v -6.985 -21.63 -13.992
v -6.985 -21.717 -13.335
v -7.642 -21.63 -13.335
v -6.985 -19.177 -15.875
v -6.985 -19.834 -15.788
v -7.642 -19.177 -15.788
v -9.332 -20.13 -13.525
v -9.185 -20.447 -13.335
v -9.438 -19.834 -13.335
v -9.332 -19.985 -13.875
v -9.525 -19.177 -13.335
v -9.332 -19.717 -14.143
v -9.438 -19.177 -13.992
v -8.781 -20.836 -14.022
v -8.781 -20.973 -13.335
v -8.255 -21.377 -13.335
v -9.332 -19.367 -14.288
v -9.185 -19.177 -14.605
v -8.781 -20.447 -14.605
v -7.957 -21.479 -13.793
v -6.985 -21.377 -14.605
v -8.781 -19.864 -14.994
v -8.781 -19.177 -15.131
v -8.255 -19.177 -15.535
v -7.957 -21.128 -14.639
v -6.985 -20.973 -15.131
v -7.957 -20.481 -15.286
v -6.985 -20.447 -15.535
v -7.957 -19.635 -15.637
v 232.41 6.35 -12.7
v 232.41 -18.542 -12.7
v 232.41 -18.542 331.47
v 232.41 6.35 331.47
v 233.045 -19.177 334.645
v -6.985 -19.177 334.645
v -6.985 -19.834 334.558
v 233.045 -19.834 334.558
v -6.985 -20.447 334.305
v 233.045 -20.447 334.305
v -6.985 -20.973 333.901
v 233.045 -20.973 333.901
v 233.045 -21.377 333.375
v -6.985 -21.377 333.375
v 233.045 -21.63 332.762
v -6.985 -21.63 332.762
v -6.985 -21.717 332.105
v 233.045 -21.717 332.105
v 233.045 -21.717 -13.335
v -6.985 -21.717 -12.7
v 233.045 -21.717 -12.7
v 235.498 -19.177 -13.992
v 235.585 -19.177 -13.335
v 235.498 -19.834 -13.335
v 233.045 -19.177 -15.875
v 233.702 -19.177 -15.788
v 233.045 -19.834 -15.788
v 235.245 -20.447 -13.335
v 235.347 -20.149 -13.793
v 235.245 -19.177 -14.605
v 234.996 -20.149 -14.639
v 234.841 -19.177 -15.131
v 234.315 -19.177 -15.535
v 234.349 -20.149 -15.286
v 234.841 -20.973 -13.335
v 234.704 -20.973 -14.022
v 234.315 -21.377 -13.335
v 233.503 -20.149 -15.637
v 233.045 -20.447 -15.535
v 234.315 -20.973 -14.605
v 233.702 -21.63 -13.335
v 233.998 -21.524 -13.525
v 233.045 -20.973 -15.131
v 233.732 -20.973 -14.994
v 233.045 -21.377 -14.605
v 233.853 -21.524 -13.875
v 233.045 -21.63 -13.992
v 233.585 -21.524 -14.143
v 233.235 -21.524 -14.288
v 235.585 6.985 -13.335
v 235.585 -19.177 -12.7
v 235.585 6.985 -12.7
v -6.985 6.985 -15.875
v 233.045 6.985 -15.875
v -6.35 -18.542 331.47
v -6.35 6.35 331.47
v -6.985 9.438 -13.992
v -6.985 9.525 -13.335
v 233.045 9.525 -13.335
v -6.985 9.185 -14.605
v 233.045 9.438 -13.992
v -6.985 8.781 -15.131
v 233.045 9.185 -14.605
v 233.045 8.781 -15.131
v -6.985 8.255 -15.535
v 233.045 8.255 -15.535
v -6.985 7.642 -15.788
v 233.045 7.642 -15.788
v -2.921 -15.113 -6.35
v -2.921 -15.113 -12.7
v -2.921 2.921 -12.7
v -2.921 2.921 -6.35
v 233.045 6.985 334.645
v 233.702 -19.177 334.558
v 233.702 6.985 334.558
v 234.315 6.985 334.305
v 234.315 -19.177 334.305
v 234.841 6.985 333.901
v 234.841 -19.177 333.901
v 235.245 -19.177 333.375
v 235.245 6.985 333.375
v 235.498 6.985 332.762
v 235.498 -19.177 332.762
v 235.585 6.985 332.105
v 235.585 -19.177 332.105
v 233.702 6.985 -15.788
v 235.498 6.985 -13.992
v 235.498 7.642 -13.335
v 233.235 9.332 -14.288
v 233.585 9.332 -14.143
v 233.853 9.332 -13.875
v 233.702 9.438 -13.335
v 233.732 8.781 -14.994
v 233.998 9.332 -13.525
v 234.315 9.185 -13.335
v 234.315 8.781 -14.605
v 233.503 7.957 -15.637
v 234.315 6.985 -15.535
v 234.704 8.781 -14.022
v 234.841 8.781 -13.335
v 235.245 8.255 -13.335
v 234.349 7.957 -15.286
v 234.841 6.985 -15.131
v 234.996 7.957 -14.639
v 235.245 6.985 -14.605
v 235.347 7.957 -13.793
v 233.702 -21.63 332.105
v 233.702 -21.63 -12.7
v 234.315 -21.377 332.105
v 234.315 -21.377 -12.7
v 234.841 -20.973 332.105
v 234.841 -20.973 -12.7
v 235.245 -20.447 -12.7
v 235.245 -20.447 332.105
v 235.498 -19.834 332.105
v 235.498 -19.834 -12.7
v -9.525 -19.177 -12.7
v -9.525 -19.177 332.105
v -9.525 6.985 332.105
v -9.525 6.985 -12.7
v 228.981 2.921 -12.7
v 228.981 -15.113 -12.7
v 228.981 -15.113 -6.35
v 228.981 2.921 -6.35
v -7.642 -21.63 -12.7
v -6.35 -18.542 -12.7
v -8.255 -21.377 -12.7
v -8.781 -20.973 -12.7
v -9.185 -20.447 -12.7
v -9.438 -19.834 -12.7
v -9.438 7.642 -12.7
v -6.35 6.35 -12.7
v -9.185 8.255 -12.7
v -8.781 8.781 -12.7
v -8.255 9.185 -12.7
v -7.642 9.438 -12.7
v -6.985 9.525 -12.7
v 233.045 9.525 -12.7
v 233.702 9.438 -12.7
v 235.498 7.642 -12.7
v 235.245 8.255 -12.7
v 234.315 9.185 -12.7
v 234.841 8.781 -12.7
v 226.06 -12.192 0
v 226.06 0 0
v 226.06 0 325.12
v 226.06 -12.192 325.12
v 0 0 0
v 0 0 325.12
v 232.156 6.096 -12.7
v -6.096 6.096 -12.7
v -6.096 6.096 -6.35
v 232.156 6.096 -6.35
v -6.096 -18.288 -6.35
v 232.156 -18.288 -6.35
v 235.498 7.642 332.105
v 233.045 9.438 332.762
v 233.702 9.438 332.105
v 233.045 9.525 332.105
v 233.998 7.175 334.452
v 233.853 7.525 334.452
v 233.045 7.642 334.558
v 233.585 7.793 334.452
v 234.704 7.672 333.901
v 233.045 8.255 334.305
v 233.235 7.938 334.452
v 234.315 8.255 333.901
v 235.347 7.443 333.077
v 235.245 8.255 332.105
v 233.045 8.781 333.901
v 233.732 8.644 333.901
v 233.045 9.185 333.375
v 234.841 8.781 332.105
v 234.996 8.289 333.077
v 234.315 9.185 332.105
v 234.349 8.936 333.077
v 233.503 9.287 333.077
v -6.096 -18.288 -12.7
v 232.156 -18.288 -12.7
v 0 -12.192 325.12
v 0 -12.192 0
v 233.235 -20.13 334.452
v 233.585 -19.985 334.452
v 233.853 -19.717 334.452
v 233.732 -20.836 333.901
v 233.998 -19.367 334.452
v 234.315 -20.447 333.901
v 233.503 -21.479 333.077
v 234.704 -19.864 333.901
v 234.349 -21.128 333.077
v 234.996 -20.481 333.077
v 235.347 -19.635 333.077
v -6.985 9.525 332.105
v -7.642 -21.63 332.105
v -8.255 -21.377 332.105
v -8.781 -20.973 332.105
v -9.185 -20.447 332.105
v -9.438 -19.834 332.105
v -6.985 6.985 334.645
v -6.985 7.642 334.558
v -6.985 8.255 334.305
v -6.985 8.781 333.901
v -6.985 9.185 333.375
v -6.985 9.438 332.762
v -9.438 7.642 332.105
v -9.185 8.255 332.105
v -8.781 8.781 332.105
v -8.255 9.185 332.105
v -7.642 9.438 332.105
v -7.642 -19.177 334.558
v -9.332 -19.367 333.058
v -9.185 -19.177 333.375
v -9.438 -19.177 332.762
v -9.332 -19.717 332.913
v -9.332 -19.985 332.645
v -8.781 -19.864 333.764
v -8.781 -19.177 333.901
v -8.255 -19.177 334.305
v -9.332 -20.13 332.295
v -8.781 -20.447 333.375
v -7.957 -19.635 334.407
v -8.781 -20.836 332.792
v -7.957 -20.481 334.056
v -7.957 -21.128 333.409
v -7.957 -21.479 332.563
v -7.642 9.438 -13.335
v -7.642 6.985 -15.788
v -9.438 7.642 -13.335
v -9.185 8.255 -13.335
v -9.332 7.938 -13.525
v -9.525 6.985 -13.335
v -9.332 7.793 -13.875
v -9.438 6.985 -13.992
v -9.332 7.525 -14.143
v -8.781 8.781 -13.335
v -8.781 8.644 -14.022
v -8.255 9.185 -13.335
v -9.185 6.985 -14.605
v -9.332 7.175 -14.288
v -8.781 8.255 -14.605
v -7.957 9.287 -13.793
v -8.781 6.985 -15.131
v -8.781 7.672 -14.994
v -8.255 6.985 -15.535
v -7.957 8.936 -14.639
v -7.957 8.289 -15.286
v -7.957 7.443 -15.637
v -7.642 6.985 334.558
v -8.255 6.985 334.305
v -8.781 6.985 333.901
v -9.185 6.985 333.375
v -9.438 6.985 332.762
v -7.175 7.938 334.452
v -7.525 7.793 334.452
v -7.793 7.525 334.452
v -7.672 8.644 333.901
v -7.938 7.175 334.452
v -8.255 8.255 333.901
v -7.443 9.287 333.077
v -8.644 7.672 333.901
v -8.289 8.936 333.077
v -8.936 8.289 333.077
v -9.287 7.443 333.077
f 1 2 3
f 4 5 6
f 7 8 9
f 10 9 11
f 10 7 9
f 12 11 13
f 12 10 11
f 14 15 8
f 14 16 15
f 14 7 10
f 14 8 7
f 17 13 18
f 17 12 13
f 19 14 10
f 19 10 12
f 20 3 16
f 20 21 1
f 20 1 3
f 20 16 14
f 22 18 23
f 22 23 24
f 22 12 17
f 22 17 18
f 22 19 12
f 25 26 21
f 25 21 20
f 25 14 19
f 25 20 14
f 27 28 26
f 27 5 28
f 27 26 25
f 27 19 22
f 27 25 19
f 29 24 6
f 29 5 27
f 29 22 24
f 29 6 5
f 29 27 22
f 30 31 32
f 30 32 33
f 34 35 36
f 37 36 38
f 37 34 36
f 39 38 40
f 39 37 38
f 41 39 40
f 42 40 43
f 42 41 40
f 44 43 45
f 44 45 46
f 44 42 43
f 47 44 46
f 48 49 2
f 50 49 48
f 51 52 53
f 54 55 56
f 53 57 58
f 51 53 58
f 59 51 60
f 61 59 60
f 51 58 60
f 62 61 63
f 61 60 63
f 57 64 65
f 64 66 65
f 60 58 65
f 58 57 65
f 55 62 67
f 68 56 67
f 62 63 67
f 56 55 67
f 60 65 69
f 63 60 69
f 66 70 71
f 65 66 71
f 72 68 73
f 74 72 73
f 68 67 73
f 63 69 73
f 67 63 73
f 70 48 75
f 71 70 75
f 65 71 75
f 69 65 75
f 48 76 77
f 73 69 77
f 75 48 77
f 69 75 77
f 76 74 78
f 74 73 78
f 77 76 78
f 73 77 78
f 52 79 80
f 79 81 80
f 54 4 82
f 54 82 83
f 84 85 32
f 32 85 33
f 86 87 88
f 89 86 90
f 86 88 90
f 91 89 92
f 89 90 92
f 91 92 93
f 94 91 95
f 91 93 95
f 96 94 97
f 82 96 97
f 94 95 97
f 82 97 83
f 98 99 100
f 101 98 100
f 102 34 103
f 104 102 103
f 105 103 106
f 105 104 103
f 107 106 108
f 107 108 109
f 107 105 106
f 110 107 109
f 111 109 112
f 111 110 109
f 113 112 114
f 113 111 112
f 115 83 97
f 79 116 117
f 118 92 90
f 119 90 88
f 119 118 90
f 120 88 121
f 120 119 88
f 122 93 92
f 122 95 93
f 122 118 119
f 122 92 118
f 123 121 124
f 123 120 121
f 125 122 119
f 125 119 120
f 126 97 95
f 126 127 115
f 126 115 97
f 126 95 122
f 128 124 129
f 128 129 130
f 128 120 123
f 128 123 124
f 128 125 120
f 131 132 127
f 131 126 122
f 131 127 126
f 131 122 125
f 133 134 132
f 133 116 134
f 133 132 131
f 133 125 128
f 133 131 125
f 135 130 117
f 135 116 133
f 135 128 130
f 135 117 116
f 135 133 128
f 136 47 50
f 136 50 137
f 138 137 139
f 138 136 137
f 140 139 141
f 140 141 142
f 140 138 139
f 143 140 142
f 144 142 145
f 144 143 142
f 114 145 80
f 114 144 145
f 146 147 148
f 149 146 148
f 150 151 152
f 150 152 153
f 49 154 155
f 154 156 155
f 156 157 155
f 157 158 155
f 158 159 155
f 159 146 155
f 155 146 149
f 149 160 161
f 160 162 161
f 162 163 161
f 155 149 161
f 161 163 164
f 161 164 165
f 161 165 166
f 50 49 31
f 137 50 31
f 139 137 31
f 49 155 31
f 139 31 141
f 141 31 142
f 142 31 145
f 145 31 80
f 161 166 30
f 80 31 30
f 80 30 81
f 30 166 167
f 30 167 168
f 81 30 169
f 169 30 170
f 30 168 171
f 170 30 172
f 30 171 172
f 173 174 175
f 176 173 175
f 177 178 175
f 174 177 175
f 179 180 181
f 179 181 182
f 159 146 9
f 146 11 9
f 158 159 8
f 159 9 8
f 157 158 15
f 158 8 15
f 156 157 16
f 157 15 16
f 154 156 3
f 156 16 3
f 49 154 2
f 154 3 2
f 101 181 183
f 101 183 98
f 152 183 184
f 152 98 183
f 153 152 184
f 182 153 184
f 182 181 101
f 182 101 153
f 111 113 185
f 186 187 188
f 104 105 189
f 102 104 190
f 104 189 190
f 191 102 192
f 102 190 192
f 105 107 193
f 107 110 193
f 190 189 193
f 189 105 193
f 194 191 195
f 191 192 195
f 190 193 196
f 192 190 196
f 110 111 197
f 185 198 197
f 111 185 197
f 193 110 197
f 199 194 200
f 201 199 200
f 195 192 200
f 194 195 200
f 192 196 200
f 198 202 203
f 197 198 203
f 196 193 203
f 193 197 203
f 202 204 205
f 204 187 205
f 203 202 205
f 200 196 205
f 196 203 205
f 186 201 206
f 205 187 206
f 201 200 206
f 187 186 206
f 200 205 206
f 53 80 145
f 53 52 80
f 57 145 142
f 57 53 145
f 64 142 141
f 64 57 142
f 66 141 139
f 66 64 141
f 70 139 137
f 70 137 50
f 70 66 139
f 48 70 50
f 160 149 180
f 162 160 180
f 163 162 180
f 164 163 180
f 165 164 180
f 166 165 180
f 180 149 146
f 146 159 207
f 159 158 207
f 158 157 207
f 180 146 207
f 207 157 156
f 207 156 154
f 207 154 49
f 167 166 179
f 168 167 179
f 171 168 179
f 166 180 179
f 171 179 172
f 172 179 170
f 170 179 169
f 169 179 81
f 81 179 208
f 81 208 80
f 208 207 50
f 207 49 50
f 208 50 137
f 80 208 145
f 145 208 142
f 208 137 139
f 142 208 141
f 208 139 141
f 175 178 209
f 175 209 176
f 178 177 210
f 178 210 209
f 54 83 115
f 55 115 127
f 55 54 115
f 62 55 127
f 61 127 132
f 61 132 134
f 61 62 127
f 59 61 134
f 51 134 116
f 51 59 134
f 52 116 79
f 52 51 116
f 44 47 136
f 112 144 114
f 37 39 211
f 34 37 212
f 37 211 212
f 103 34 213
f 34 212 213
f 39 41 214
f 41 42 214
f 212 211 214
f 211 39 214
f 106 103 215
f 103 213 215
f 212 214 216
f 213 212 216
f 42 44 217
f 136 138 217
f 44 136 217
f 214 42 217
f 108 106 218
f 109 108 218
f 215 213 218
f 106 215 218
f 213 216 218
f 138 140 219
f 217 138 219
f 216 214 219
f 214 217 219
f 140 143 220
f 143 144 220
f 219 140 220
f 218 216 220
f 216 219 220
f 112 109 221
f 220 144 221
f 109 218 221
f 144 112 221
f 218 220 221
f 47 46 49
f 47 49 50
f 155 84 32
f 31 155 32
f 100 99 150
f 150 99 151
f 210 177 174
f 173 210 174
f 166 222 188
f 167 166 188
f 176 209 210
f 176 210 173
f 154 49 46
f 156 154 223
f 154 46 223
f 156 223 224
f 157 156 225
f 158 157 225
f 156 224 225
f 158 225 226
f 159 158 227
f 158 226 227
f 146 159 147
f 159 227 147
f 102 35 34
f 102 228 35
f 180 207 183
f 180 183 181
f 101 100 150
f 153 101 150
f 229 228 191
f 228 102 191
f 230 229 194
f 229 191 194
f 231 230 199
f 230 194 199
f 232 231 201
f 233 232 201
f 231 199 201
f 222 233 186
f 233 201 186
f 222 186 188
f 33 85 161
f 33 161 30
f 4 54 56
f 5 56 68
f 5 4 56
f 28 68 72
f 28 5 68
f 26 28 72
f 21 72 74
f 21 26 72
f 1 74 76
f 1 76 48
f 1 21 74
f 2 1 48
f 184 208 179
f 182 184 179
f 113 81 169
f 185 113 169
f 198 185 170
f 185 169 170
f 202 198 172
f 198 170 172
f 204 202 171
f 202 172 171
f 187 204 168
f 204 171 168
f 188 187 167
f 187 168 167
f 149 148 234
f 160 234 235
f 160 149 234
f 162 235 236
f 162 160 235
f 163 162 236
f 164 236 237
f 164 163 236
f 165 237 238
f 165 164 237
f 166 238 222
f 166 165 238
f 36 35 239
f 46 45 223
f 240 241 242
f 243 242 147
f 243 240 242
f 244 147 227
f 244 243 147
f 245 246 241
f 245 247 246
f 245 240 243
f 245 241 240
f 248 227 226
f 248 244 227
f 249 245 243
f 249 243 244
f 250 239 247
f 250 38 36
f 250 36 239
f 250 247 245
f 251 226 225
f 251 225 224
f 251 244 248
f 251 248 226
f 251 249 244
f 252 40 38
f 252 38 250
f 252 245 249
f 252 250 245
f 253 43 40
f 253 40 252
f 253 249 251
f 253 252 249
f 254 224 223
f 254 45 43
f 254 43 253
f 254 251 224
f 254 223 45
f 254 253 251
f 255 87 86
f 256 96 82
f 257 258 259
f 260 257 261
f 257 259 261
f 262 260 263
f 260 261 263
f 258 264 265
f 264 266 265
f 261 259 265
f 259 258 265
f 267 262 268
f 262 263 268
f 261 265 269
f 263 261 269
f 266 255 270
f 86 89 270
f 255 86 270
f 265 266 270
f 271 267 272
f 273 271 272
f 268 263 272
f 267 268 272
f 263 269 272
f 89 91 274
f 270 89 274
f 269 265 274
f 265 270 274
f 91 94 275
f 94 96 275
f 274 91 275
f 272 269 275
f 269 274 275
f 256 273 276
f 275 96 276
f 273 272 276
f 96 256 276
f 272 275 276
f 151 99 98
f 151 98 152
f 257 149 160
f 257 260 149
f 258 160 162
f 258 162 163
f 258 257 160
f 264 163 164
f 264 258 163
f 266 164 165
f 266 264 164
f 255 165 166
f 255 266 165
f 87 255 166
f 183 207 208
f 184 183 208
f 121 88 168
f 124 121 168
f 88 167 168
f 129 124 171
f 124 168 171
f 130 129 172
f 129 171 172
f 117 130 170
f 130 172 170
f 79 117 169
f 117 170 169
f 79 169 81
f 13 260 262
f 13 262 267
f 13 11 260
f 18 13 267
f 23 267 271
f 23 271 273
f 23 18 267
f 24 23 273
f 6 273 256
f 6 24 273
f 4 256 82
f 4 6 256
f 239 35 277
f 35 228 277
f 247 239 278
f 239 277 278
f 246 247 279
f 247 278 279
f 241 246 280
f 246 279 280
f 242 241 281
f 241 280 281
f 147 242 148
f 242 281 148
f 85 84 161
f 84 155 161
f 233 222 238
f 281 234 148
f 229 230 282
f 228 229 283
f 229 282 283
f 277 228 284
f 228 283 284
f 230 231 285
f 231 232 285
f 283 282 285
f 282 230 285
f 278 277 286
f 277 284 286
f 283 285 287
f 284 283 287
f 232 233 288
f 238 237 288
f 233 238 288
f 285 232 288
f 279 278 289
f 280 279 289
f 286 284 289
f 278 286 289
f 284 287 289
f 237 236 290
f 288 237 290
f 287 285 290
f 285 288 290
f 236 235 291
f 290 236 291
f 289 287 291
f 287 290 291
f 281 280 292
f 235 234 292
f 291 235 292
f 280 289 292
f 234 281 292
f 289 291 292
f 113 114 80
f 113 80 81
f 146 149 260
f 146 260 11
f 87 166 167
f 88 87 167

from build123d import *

# Parameters (mm, degrees)
F0_W          = 226.06
F0_H          = 325.12
F1_DEPTH      = 12.192
F2_W          = 245.11
F2_H          = 31.242
F2_W_2        = 238.76
F2_H_2        = 24.892
F3_DEPTH      = 337.82
F3_DEPTH_BACK = 6.35
F4_W          = 245.11
F4_H          = 31.242
F5_DEPTH      = 3.175
F6_W          = 245.11
F6_H          = 31.242
F7_DEPTH      = 3.175
F8_W          = 238.252
F8_H          = 24.384
F8_W_2        = 231.902
F8_H_2        = 18.034
F9_DEPTH      = 6.35
F10_R         = 2.54
F11_R         = 2.54
F11_2_R       = 2.54
F12_R         = 2.54
F12_2_R       = 2.54


# Not quite as in the source:
# - two fillets or chamfers of one size are made in one step


with BuildPart() as f1:
    # F0 (on Front) → F1 (new body)
    with BuildSketch(Plane.XZ):
        with Locations((113.03, 162.56)):
            Rectangle(F0_W, F0_H)
    extrude(amount=F1_DEPTH)


with BuildPart() as f3:
    # F2 (on face) → F3 (new body, two sides)
    with BuildSketch(Plane.XY.offset(325.12)) as f3_sk:
        with Locations((113.03, -6.096)):
            Rectangle(F2_W, F2_H)
        with Locations((113.03, -6.096)):
            Rectangle(F2_W_2, F2_H_2, mode=Mode.SUBTRACT)
    extrude(amount=-F3_DEPTH)
    extrude(f3_sk.sketch, amount=F3_DEPTH_BACK)

    # F4 (on face) → F5 (join)
    with BuildSketch(Plane.XY.offset(331.47)):
        with Locations((113.03, -6.096)):
            Rectangle(F4_W, F4_H)
    extrude(amount=F5_DEPTH)

    # F11
    f11_edges = [f3.edges().sort_by_distance(p)[0] for p in [
        (235.585, -21.717, 160.9725),
    ]]
    fillet(f11_edges, radius=F11_R)

    # F12
    f12_edges = [f3.edges().sort_by_distance(p)[0] for p in [
        (235.585, 9.525, 160.9725),
        (235.585, -4.826, 334.645),
        (234.841051, -20.973051, 334.645),
        (-9.525, 9.525, 160.9725),
        (113.03, 9.525, 334.645),
        (111.76, -21.717, 334.645),
        (-9.525, -6.096, 334.645),
        (-9.525, -21.717, 160.9725),
    ]]
    fillet(f12_edges, radius=F12_R)


with BuildPart() as f7:
    # F6 (on face) → F7 (new body)
    with BuildSketch(Plane(origin=(0, 0, -12.7), x_dir=(1, 0, 0), z_dir=(0, 0, -1))):
        with Locations((113.03, 6.096)):
            Rectangle(F6_W, F6_H)
    extrude(amount=F7_DEPTH)

    # F8 (on face) → F9 (join)
    with BuildSketch(Plane.XY.offset(-12.7)):
        with Locations((113.03, -6.096)):
            Rectangle(F8_W, F8_H)
        with Locations((113.03, -6.096)):
            Rectangle(F8_W_2, F8_H_2, mode=Mode.SUBTRACT)
    extrude(amount=F9_DEPTH)

    # F10
    f10_edges = [f7.edges().sort_by_distance(p)[0] for p in [
        (235.585, -6.096, -15.875),
    ]]
    fillet(f10_edges, radius=F10_R)

    # F11#2
    f11_2_edges = [f7.edges().sort_by_distance(p)[0] for p in [
        (111.76, 9.525, -15.875),
    ]]
    fillet(f11_2_edges, radius=F11_2_R)

    # F12#2
    f12_2_edges = [f7.edges().sort_by_distance(p)[0] for p in [
        (235.585, -21.717, -13.0175),
        (234.841051, -21.717, -15.131051),
        (111.76, -21.717, -15.875),
        (-9.525, -21.717, -14.2875),
        (-9.525, -7.366, -15.875),
        (-9.525, 9.525, -13.0175),
        (-9.525, 8.781051, -15.131051),
    ]]
    fillet(f12_2_edges, radius=F12_2_R)


solid = Compound([f1.part, f3.part, f7.part])
